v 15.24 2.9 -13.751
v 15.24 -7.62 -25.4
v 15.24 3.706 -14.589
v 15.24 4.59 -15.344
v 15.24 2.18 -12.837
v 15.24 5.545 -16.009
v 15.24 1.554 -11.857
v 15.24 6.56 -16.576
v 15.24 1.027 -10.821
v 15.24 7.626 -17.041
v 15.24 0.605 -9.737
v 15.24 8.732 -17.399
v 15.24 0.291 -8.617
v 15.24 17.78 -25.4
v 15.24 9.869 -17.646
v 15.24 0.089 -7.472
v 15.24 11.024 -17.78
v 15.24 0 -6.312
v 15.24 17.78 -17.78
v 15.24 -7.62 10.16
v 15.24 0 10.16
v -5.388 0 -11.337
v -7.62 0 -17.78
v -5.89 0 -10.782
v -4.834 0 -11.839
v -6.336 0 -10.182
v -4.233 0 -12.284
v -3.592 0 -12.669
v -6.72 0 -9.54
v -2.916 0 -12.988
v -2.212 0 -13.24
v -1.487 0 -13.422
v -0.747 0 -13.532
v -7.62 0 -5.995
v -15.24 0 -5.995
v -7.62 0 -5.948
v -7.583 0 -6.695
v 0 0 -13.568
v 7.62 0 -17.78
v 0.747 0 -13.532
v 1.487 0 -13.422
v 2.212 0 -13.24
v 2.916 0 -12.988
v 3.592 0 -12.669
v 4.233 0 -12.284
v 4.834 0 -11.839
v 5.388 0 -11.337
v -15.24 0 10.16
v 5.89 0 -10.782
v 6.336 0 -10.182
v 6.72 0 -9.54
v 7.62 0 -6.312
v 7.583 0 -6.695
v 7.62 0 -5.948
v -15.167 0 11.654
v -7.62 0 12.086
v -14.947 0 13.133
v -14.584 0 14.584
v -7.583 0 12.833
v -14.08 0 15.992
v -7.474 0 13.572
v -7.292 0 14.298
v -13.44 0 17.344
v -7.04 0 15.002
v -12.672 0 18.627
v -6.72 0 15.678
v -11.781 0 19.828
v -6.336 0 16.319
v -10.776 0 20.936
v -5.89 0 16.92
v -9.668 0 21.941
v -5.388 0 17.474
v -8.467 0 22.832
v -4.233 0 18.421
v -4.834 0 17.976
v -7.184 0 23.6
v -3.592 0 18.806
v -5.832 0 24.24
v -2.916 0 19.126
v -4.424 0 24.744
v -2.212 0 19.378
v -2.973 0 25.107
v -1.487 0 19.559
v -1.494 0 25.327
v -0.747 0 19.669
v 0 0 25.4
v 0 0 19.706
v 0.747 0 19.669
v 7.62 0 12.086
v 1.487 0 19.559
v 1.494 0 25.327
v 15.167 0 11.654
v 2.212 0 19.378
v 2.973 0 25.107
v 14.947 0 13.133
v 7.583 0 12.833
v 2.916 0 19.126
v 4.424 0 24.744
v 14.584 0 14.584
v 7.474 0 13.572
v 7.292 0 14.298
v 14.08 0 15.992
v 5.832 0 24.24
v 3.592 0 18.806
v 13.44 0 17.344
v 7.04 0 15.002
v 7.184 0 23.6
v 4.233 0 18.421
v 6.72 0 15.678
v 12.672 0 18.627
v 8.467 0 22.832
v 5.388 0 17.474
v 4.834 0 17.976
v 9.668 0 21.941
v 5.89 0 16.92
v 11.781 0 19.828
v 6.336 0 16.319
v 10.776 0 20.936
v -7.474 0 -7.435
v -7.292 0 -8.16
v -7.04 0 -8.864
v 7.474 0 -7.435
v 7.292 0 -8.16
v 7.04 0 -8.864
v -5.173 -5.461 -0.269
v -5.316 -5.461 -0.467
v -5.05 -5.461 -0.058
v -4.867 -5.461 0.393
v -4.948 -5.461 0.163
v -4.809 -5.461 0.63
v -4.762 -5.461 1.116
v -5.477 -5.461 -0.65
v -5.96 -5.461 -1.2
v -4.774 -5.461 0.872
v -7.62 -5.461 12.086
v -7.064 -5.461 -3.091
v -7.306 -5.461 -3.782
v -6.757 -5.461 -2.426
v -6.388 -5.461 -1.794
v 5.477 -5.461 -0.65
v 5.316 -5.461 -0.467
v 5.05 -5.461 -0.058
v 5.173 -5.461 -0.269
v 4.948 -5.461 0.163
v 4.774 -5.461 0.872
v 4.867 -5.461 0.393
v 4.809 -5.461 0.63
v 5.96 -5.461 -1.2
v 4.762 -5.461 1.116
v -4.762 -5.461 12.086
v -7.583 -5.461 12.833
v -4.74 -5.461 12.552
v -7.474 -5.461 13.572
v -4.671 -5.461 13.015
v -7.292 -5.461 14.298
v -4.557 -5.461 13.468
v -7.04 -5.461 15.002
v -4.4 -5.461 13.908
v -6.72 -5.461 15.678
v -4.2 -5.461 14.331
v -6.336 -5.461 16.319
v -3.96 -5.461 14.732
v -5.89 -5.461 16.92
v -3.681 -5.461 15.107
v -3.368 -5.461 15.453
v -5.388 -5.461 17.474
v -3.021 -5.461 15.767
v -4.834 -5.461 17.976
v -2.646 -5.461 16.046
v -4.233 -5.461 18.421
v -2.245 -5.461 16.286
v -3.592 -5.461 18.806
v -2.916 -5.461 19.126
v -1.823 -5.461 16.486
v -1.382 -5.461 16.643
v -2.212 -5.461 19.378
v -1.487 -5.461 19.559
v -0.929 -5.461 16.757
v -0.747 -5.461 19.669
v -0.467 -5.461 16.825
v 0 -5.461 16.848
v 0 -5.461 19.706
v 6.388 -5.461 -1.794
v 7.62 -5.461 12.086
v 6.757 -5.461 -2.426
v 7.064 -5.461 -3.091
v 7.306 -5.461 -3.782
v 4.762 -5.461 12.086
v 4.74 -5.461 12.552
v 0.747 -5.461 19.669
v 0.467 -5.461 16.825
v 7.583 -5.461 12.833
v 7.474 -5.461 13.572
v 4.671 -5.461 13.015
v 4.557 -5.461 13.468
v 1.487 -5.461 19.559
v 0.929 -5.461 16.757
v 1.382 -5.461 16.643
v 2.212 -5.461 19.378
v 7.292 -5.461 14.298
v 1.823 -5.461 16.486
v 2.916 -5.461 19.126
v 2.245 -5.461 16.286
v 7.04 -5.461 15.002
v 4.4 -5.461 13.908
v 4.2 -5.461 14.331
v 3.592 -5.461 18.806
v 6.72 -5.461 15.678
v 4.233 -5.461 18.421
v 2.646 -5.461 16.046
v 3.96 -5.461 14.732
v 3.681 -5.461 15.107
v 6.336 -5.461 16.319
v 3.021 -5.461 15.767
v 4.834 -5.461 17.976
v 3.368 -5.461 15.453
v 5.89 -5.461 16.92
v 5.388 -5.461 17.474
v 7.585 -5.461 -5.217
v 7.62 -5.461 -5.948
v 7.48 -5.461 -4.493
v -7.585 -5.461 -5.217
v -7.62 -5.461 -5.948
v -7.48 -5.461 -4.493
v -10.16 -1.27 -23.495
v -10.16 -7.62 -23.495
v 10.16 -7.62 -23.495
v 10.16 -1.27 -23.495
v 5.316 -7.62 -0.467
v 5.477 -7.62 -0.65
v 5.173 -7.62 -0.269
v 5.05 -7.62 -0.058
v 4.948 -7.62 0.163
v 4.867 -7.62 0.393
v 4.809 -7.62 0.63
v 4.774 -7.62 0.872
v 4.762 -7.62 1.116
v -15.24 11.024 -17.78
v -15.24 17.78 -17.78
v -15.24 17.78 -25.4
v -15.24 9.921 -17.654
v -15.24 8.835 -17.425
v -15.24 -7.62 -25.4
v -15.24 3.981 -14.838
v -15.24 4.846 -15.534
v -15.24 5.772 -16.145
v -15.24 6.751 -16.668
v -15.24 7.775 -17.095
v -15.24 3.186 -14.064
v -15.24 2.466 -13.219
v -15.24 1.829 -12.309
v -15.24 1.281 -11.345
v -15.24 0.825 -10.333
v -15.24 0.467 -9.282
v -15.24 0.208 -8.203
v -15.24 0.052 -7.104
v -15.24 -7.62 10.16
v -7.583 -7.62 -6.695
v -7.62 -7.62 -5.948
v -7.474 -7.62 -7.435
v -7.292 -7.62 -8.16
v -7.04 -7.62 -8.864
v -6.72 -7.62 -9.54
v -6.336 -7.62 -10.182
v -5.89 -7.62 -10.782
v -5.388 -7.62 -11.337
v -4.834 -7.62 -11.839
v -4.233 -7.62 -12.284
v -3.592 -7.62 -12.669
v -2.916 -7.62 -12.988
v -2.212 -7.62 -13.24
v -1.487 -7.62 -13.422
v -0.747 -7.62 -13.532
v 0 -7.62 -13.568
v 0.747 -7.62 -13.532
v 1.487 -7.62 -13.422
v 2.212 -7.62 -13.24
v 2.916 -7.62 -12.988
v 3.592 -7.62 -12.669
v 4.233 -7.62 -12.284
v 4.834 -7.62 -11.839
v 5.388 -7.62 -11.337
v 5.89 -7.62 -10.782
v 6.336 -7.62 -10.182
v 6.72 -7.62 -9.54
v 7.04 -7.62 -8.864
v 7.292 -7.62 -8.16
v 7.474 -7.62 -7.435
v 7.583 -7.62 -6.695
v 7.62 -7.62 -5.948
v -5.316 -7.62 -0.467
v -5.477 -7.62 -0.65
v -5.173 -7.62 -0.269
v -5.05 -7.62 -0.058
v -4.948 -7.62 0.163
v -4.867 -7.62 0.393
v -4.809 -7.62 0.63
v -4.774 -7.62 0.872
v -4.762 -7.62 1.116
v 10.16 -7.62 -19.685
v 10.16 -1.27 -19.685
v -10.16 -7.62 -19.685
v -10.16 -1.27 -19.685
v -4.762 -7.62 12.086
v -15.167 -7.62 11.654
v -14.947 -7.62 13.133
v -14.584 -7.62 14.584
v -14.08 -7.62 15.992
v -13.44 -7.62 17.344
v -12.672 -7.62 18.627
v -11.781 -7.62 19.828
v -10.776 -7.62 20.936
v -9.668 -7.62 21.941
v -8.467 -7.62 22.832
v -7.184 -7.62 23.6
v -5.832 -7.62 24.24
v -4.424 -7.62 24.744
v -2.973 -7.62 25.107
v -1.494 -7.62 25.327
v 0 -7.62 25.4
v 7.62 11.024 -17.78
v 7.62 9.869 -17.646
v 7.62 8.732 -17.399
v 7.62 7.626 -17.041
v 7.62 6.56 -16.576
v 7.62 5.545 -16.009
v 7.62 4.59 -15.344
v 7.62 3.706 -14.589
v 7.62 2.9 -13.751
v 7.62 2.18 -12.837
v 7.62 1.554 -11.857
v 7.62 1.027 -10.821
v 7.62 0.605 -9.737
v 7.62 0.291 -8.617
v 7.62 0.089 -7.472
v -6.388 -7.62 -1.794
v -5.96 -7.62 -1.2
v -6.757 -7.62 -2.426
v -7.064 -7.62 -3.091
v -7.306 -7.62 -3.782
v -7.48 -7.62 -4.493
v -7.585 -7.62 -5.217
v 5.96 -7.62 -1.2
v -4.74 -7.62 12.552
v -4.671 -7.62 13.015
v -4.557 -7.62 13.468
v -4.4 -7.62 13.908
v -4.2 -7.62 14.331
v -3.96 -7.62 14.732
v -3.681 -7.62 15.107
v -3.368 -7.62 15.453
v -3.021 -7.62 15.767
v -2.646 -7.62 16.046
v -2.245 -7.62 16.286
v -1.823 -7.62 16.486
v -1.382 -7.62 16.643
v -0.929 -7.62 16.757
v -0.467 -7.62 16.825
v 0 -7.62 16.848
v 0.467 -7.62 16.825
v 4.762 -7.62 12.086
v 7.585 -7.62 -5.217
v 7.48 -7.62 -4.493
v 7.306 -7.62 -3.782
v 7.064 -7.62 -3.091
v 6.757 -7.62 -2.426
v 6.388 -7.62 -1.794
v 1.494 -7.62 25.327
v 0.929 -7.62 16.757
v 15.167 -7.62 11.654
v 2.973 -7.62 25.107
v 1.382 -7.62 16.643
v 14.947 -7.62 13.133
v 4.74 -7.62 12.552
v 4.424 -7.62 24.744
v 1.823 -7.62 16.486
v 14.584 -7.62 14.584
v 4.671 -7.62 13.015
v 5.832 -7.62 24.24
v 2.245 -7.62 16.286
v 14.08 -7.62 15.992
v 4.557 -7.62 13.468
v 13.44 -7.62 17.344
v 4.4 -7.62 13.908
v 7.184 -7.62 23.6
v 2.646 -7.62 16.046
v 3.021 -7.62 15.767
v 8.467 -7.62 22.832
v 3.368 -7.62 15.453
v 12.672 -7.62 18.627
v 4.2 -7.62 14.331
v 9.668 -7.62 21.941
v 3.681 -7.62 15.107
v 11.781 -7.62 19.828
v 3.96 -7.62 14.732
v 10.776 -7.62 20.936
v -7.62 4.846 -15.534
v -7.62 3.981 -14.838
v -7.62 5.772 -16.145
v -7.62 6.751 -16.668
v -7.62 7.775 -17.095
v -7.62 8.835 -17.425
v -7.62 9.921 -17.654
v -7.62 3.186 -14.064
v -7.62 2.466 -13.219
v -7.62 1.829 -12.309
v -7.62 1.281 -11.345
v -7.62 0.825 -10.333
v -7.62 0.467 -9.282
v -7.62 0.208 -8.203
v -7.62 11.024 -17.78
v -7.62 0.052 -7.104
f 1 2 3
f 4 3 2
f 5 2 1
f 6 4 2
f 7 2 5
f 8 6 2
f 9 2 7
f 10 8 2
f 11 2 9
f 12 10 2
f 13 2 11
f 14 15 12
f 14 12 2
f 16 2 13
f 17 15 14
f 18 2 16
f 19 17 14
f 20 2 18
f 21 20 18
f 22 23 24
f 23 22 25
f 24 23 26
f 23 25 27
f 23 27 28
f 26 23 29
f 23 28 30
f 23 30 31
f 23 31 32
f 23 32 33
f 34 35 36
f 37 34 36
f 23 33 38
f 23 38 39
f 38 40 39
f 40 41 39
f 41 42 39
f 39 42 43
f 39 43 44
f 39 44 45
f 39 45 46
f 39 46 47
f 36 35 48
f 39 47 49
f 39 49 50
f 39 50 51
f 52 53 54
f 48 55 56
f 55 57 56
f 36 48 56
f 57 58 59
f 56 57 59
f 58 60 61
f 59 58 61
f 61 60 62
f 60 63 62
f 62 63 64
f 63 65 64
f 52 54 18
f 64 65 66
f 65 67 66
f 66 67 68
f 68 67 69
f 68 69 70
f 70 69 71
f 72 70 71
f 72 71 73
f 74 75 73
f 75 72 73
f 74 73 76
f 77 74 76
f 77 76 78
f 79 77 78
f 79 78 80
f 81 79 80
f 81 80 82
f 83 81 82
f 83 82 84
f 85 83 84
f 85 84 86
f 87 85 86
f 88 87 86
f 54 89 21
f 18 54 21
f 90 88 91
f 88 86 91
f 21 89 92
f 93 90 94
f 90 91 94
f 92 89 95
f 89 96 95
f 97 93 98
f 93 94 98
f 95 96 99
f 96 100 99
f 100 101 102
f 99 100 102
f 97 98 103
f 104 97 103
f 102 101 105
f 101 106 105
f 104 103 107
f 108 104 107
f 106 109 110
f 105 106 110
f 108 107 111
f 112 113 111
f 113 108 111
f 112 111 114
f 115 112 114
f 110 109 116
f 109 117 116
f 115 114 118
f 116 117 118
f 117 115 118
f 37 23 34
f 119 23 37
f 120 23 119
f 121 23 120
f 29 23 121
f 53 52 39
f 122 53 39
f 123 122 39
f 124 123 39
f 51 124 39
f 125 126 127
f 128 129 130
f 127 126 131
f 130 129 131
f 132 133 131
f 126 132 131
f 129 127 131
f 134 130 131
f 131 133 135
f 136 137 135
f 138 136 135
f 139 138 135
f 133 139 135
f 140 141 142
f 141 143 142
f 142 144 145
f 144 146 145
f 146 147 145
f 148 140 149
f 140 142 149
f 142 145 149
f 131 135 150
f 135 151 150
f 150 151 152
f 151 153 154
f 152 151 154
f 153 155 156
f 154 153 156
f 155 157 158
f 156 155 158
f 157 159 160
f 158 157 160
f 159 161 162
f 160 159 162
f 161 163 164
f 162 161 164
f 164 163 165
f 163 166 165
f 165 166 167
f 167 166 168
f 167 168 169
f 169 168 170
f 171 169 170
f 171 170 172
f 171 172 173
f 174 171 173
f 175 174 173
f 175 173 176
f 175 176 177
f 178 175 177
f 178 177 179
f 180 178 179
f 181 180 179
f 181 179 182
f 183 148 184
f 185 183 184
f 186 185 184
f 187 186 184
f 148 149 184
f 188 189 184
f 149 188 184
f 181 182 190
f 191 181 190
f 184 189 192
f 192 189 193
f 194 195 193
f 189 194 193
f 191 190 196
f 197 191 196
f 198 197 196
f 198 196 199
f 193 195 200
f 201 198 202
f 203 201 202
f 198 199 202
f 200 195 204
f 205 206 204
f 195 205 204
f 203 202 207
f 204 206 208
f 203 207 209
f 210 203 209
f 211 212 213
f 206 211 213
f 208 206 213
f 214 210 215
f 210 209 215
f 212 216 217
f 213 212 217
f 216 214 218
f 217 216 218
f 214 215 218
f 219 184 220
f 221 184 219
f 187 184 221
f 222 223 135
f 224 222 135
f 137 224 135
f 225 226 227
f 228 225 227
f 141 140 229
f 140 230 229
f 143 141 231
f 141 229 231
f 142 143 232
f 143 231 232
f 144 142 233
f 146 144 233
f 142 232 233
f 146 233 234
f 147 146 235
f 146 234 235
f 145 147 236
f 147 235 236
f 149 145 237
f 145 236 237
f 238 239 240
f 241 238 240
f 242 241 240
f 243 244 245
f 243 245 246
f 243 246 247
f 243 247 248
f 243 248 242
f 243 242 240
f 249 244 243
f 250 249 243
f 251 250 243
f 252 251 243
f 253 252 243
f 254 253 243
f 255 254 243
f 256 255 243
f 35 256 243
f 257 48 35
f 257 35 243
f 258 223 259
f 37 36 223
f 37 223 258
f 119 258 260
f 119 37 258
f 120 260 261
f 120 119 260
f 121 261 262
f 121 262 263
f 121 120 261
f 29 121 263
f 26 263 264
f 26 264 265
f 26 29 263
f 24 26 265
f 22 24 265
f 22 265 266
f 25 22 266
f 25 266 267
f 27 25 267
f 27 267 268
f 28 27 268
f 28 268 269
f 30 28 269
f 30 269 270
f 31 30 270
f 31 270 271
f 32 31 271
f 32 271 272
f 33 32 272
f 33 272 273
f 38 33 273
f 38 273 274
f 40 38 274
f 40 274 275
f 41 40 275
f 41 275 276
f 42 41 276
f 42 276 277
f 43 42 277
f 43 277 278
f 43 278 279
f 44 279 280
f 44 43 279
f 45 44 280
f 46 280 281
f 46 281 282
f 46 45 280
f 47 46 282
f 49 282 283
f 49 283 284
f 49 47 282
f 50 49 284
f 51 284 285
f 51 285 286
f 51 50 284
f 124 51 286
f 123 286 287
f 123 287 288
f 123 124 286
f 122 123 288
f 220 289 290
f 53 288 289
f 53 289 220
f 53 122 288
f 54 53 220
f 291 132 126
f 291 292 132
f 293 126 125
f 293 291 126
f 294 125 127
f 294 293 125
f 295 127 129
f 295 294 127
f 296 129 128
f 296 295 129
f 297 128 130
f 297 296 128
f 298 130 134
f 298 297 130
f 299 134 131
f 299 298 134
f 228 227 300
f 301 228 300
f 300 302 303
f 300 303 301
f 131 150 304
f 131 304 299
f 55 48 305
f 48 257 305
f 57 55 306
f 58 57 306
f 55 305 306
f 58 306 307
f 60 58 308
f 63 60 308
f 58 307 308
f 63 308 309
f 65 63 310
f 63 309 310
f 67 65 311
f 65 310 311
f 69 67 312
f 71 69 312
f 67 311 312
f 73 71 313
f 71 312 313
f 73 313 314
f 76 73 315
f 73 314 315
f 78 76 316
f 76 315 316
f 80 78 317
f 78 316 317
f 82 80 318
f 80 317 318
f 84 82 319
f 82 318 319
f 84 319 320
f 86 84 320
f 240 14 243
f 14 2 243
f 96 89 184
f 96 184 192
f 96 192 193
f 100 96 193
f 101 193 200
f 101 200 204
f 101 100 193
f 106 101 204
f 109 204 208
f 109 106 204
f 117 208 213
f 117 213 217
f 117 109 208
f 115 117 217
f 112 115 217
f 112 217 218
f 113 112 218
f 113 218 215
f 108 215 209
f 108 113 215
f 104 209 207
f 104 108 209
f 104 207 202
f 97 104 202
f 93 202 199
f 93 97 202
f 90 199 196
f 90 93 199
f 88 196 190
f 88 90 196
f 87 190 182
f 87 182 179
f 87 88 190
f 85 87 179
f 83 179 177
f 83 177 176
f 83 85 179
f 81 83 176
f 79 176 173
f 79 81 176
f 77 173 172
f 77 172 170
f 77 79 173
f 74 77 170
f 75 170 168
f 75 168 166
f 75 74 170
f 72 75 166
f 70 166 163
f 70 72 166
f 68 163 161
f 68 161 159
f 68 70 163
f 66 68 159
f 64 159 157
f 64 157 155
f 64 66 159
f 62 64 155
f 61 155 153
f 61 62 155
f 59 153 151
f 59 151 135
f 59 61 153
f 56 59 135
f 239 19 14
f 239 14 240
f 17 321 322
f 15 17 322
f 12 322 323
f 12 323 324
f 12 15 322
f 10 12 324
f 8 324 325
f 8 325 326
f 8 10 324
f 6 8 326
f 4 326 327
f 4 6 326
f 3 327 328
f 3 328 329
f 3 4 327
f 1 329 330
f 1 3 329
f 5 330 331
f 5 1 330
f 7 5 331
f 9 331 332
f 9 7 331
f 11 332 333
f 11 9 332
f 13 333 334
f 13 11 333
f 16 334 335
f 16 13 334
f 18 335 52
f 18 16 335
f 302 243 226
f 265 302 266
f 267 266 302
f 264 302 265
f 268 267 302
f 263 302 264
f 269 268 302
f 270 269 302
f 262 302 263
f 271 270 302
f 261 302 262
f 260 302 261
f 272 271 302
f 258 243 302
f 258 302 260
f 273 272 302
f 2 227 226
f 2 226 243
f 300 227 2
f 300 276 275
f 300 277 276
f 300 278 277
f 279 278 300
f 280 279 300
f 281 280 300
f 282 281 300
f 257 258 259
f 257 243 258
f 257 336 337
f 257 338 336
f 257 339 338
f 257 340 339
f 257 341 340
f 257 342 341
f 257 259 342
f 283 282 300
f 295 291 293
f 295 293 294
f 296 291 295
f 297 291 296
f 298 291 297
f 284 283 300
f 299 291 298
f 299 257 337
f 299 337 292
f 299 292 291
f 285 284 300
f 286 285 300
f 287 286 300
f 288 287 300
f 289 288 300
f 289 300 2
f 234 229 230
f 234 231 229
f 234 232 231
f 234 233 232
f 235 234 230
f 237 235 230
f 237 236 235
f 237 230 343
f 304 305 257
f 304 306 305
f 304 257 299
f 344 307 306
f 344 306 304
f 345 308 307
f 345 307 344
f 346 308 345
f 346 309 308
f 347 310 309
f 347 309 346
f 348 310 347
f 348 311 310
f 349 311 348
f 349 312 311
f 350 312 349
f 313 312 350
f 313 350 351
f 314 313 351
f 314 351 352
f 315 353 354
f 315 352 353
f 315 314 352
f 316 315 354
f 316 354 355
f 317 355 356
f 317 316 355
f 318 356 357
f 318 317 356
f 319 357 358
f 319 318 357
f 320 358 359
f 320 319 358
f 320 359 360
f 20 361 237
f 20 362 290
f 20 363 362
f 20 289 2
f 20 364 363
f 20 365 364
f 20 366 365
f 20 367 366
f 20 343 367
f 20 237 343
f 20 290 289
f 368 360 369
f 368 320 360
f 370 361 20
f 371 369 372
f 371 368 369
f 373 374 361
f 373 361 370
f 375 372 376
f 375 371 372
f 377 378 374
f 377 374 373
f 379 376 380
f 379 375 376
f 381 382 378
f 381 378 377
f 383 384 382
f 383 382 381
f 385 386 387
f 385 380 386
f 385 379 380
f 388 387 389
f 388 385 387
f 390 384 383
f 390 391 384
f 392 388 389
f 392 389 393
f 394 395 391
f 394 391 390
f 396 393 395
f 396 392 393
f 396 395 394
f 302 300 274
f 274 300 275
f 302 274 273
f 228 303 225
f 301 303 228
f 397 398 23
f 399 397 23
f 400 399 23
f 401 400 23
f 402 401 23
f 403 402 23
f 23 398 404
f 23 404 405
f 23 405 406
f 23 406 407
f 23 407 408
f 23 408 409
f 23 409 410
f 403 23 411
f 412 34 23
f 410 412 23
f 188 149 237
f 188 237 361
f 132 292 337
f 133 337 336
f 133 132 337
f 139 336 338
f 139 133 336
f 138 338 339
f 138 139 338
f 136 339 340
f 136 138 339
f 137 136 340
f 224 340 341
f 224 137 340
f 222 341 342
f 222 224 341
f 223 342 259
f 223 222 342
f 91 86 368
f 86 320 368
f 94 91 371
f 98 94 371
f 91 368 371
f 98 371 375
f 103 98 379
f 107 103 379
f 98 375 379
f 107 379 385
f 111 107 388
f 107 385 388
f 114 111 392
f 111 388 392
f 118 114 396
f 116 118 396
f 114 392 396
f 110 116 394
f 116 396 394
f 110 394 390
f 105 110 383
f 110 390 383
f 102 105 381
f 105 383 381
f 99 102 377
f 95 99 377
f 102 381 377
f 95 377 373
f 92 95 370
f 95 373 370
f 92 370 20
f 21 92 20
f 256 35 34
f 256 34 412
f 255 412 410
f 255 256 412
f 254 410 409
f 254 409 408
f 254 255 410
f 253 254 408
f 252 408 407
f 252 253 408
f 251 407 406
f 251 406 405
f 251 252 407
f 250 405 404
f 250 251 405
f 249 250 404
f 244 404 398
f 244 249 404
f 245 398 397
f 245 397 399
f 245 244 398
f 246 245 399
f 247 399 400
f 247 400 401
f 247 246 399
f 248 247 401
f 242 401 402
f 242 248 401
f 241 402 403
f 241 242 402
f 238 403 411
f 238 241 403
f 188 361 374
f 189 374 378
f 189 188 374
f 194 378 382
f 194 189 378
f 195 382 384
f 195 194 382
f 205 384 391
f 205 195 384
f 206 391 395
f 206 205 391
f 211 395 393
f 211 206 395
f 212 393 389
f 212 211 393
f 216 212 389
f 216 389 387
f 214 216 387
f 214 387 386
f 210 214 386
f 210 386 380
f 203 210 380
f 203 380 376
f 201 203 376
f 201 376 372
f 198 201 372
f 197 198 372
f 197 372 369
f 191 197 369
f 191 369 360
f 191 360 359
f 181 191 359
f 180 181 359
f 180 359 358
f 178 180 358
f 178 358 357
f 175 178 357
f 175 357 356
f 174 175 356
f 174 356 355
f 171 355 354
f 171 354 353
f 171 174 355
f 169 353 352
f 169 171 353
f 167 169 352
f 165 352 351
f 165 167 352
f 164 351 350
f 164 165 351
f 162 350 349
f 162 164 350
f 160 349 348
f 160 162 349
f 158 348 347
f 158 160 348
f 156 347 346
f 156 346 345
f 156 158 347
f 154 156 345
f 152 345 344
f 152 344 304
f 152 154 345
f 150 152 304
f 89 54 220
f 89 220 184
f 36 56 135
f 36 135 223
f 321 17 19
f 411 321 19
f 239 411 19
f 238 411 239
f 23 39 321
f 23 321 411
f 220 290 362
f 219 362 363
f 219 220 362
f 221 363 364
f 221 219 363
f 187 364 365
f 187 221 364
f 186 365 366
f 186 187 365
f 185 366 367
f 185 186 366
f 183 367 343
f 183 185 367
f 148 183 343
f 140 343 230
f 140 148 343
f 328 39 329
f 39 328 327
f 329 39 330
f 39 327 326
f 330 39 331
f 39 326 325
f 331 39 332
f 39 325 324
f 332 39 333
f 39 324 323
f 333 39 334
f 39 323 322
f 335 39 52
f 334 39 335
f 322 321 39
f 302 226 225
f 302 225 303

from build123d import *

# Parameters (mm, degrees)
F0_W      = 30.48
F0_H      = 50.8
F2_DEPTH  = 7.62
F3_DEPTH  = 7.62
F4_DEPTH  = 5.461
F5_W      = 30.48
F5_H      = 7.62
F6_DEPTH  = 17.78
F8_DEPTH  = 7.62
F10_DEPTH = 7.62
F11_W     = 20.32
F11_H     = 3.81
F12_DEPTH = 6.35
F13_R     = 15.23999
F14_R     = 2.54


# Not quite as in the source:
# - a fillet or chamfer is up to 0.001 mm smaller than in the source, because OpenCascade refuses the exact size


with BuildPart() as f2:
    # F0 (on Front) → F2 (new body)
    with BuildSketch(Plane.XZ):
        Rectangle(F0_W, F0_H)
    extrude(amount=F2_DEPTH)

    # F1 (on face) → F3 (cut)
    with BuildSketch(Plane.XZ):
        with BuildLine():
            Line((4.7625, 0), (4.7625, 12.0856394065))
            ThreePointArc((4.7625, 12.0856394065), (0, 16.8481394065), (-4.7625, 12.0856394065))
            Line((-4.7625, 12.0856394065), (-4.7625, 0))
            ThreePointArc((-4.7625, 0), (-6.8685751798, -2.6488038051), (-7.62, -5.9483605935))
            ThreePointArc((-7.62, -5.9483605935), (0, -13.5683605935), (7.62, -5.9483605935))
            ThreePointArc((7.62, -5.9483605935), (6.8685751798, -2.6488038051), (4.7625, 0))
        make_face()
    extrude(amount=F3_DEPTH, mode=Mode.SUBTRACT)

    # F1 (on face) → F4 (cut)
    with BuildSketch(Plane.XZ):
        with BuildLine():
            Line((4.7625, 0), (4.7625, 12.0856394065))
            ThreePointArc((4.7625, 12.0856394065), (0, 16.8481394065), (-4.7625, 12.0856394065))
            Line((-4.7625, 12.0856394065), (-4.7625, 0))
            ThreePointArc((-4.7625, 0), (-6.8685751798, -2.6488038051), (-7.62, -5.9483605935))
            ThreePointArc((-7.62, -5.9483605935), (0, -13.5683605935), (7.62, -5.9483605935))
            ThreePointArc((7.62, -5.9483605935), (6.8685751798, -2.6488038051), (4.7625, 0))
        make_face()
        with BuildLine():
            ThreePointArc((-4.7625, 12.0856394065), (0, 16.8481394065), (4.7625, 12.0856394065))
            Line((4.7625, 12.0856394065), (4.7625, 0))
            ThreePointArc((4.7625, 0), (6.8685751798, -2.6488038051), (7.62, -5.9483605935))
            Line((7.62, -5.9483605935), (7.62, 12.0856394065))
            ThreePointArc((7.62, 12.0856394065), (0, 19.7056394065), (-7.62, 12.0856394065))
            Line((-7.62, 12.0856394065), (-7.62, -5.9483605935))
            ThreePointArc((-7.62, -5.9483605935), (-6.8685751798, -2.6488038051), (-4.7625, 0))
            Line((-4.7625, 0), (-4.7625, 12.0856394065))
        make_face()
    extrude(amount=F4_DEPTH, mode=Mode.SUBTRACT)

    # F5 (on face) → F6 (join)
    with BuildSketch(Plane(origin=(0, 0, 0), x_dir=(-1, 0, 0), z_dir=(0, 1, 0))):
        with Locations((0, -21.59)):
            Rectangle(F5_W, F5_H)
    extrude(amount=F6_DEPTH)

    # F7 (on face) → F8 (join)
    with BuildSketch(Plane.YZ.offset(15.24)):
        with BuildLine():
            ThreePointArc((11.0238203779, -17.78), (3.2923822905, -14.1798622678), (0, -6.3124392182))
            Line((0, -6.3124392182), (0, -17.78))
            Line((0, -17.78), (11.0238203779, -17.78))
        make_face()
    extrude(amount=-F8_DEPTH)

    # F9 (on face) → F10 (join)
    with BuildSketch(Plane(origin=(-15.24, 0, 0), x_dir=(0, -1, 0), z_dir=(-1, 0, 0))):
        with BuildLine():
            Line((-11.0238286, -17.78), (0, -17.78))
            Line((0, -17.78), (0, -5.9952606229))
            ThreePointArc((0, -5.9952606229), (-3.1855434206, -14.0637933146), (-11.0238286, -17.78))
        make_face()
    extrude(amount=-F10_DEPTH)

    # F11 (on face) → F12 (cut)
    with BuildSketch(Plane.XZ.offset(7.62)):
        with Locations((0, -21.59)):
            Rectangle(F11_W, F11_H)
    extrude(amount=-F12_DEPTH, mode=Mode.SUBTRACT)

    # F13 (radius 15.24 in the source; OpenCascade refuses exactly that, so slightly less here)
    f13_edges = [f2.edges().sort_by_distance(p)[0] for p in [
        (15.24, -3.81, 25.4),
        (-15.24, -3.81, 25.4),
    ]]
    fillet(f13_edges, radius=F13_R)

    # F14
    f14_edges = [f2.edges().sort_by_distance(p)[0] for p in [
        (4.7625, -6.5405, 0),
        (-4.7625, -6.5405, 0),
    ]]
    fillet(f14_edges, radius=F14_R)


solid = f2.part
